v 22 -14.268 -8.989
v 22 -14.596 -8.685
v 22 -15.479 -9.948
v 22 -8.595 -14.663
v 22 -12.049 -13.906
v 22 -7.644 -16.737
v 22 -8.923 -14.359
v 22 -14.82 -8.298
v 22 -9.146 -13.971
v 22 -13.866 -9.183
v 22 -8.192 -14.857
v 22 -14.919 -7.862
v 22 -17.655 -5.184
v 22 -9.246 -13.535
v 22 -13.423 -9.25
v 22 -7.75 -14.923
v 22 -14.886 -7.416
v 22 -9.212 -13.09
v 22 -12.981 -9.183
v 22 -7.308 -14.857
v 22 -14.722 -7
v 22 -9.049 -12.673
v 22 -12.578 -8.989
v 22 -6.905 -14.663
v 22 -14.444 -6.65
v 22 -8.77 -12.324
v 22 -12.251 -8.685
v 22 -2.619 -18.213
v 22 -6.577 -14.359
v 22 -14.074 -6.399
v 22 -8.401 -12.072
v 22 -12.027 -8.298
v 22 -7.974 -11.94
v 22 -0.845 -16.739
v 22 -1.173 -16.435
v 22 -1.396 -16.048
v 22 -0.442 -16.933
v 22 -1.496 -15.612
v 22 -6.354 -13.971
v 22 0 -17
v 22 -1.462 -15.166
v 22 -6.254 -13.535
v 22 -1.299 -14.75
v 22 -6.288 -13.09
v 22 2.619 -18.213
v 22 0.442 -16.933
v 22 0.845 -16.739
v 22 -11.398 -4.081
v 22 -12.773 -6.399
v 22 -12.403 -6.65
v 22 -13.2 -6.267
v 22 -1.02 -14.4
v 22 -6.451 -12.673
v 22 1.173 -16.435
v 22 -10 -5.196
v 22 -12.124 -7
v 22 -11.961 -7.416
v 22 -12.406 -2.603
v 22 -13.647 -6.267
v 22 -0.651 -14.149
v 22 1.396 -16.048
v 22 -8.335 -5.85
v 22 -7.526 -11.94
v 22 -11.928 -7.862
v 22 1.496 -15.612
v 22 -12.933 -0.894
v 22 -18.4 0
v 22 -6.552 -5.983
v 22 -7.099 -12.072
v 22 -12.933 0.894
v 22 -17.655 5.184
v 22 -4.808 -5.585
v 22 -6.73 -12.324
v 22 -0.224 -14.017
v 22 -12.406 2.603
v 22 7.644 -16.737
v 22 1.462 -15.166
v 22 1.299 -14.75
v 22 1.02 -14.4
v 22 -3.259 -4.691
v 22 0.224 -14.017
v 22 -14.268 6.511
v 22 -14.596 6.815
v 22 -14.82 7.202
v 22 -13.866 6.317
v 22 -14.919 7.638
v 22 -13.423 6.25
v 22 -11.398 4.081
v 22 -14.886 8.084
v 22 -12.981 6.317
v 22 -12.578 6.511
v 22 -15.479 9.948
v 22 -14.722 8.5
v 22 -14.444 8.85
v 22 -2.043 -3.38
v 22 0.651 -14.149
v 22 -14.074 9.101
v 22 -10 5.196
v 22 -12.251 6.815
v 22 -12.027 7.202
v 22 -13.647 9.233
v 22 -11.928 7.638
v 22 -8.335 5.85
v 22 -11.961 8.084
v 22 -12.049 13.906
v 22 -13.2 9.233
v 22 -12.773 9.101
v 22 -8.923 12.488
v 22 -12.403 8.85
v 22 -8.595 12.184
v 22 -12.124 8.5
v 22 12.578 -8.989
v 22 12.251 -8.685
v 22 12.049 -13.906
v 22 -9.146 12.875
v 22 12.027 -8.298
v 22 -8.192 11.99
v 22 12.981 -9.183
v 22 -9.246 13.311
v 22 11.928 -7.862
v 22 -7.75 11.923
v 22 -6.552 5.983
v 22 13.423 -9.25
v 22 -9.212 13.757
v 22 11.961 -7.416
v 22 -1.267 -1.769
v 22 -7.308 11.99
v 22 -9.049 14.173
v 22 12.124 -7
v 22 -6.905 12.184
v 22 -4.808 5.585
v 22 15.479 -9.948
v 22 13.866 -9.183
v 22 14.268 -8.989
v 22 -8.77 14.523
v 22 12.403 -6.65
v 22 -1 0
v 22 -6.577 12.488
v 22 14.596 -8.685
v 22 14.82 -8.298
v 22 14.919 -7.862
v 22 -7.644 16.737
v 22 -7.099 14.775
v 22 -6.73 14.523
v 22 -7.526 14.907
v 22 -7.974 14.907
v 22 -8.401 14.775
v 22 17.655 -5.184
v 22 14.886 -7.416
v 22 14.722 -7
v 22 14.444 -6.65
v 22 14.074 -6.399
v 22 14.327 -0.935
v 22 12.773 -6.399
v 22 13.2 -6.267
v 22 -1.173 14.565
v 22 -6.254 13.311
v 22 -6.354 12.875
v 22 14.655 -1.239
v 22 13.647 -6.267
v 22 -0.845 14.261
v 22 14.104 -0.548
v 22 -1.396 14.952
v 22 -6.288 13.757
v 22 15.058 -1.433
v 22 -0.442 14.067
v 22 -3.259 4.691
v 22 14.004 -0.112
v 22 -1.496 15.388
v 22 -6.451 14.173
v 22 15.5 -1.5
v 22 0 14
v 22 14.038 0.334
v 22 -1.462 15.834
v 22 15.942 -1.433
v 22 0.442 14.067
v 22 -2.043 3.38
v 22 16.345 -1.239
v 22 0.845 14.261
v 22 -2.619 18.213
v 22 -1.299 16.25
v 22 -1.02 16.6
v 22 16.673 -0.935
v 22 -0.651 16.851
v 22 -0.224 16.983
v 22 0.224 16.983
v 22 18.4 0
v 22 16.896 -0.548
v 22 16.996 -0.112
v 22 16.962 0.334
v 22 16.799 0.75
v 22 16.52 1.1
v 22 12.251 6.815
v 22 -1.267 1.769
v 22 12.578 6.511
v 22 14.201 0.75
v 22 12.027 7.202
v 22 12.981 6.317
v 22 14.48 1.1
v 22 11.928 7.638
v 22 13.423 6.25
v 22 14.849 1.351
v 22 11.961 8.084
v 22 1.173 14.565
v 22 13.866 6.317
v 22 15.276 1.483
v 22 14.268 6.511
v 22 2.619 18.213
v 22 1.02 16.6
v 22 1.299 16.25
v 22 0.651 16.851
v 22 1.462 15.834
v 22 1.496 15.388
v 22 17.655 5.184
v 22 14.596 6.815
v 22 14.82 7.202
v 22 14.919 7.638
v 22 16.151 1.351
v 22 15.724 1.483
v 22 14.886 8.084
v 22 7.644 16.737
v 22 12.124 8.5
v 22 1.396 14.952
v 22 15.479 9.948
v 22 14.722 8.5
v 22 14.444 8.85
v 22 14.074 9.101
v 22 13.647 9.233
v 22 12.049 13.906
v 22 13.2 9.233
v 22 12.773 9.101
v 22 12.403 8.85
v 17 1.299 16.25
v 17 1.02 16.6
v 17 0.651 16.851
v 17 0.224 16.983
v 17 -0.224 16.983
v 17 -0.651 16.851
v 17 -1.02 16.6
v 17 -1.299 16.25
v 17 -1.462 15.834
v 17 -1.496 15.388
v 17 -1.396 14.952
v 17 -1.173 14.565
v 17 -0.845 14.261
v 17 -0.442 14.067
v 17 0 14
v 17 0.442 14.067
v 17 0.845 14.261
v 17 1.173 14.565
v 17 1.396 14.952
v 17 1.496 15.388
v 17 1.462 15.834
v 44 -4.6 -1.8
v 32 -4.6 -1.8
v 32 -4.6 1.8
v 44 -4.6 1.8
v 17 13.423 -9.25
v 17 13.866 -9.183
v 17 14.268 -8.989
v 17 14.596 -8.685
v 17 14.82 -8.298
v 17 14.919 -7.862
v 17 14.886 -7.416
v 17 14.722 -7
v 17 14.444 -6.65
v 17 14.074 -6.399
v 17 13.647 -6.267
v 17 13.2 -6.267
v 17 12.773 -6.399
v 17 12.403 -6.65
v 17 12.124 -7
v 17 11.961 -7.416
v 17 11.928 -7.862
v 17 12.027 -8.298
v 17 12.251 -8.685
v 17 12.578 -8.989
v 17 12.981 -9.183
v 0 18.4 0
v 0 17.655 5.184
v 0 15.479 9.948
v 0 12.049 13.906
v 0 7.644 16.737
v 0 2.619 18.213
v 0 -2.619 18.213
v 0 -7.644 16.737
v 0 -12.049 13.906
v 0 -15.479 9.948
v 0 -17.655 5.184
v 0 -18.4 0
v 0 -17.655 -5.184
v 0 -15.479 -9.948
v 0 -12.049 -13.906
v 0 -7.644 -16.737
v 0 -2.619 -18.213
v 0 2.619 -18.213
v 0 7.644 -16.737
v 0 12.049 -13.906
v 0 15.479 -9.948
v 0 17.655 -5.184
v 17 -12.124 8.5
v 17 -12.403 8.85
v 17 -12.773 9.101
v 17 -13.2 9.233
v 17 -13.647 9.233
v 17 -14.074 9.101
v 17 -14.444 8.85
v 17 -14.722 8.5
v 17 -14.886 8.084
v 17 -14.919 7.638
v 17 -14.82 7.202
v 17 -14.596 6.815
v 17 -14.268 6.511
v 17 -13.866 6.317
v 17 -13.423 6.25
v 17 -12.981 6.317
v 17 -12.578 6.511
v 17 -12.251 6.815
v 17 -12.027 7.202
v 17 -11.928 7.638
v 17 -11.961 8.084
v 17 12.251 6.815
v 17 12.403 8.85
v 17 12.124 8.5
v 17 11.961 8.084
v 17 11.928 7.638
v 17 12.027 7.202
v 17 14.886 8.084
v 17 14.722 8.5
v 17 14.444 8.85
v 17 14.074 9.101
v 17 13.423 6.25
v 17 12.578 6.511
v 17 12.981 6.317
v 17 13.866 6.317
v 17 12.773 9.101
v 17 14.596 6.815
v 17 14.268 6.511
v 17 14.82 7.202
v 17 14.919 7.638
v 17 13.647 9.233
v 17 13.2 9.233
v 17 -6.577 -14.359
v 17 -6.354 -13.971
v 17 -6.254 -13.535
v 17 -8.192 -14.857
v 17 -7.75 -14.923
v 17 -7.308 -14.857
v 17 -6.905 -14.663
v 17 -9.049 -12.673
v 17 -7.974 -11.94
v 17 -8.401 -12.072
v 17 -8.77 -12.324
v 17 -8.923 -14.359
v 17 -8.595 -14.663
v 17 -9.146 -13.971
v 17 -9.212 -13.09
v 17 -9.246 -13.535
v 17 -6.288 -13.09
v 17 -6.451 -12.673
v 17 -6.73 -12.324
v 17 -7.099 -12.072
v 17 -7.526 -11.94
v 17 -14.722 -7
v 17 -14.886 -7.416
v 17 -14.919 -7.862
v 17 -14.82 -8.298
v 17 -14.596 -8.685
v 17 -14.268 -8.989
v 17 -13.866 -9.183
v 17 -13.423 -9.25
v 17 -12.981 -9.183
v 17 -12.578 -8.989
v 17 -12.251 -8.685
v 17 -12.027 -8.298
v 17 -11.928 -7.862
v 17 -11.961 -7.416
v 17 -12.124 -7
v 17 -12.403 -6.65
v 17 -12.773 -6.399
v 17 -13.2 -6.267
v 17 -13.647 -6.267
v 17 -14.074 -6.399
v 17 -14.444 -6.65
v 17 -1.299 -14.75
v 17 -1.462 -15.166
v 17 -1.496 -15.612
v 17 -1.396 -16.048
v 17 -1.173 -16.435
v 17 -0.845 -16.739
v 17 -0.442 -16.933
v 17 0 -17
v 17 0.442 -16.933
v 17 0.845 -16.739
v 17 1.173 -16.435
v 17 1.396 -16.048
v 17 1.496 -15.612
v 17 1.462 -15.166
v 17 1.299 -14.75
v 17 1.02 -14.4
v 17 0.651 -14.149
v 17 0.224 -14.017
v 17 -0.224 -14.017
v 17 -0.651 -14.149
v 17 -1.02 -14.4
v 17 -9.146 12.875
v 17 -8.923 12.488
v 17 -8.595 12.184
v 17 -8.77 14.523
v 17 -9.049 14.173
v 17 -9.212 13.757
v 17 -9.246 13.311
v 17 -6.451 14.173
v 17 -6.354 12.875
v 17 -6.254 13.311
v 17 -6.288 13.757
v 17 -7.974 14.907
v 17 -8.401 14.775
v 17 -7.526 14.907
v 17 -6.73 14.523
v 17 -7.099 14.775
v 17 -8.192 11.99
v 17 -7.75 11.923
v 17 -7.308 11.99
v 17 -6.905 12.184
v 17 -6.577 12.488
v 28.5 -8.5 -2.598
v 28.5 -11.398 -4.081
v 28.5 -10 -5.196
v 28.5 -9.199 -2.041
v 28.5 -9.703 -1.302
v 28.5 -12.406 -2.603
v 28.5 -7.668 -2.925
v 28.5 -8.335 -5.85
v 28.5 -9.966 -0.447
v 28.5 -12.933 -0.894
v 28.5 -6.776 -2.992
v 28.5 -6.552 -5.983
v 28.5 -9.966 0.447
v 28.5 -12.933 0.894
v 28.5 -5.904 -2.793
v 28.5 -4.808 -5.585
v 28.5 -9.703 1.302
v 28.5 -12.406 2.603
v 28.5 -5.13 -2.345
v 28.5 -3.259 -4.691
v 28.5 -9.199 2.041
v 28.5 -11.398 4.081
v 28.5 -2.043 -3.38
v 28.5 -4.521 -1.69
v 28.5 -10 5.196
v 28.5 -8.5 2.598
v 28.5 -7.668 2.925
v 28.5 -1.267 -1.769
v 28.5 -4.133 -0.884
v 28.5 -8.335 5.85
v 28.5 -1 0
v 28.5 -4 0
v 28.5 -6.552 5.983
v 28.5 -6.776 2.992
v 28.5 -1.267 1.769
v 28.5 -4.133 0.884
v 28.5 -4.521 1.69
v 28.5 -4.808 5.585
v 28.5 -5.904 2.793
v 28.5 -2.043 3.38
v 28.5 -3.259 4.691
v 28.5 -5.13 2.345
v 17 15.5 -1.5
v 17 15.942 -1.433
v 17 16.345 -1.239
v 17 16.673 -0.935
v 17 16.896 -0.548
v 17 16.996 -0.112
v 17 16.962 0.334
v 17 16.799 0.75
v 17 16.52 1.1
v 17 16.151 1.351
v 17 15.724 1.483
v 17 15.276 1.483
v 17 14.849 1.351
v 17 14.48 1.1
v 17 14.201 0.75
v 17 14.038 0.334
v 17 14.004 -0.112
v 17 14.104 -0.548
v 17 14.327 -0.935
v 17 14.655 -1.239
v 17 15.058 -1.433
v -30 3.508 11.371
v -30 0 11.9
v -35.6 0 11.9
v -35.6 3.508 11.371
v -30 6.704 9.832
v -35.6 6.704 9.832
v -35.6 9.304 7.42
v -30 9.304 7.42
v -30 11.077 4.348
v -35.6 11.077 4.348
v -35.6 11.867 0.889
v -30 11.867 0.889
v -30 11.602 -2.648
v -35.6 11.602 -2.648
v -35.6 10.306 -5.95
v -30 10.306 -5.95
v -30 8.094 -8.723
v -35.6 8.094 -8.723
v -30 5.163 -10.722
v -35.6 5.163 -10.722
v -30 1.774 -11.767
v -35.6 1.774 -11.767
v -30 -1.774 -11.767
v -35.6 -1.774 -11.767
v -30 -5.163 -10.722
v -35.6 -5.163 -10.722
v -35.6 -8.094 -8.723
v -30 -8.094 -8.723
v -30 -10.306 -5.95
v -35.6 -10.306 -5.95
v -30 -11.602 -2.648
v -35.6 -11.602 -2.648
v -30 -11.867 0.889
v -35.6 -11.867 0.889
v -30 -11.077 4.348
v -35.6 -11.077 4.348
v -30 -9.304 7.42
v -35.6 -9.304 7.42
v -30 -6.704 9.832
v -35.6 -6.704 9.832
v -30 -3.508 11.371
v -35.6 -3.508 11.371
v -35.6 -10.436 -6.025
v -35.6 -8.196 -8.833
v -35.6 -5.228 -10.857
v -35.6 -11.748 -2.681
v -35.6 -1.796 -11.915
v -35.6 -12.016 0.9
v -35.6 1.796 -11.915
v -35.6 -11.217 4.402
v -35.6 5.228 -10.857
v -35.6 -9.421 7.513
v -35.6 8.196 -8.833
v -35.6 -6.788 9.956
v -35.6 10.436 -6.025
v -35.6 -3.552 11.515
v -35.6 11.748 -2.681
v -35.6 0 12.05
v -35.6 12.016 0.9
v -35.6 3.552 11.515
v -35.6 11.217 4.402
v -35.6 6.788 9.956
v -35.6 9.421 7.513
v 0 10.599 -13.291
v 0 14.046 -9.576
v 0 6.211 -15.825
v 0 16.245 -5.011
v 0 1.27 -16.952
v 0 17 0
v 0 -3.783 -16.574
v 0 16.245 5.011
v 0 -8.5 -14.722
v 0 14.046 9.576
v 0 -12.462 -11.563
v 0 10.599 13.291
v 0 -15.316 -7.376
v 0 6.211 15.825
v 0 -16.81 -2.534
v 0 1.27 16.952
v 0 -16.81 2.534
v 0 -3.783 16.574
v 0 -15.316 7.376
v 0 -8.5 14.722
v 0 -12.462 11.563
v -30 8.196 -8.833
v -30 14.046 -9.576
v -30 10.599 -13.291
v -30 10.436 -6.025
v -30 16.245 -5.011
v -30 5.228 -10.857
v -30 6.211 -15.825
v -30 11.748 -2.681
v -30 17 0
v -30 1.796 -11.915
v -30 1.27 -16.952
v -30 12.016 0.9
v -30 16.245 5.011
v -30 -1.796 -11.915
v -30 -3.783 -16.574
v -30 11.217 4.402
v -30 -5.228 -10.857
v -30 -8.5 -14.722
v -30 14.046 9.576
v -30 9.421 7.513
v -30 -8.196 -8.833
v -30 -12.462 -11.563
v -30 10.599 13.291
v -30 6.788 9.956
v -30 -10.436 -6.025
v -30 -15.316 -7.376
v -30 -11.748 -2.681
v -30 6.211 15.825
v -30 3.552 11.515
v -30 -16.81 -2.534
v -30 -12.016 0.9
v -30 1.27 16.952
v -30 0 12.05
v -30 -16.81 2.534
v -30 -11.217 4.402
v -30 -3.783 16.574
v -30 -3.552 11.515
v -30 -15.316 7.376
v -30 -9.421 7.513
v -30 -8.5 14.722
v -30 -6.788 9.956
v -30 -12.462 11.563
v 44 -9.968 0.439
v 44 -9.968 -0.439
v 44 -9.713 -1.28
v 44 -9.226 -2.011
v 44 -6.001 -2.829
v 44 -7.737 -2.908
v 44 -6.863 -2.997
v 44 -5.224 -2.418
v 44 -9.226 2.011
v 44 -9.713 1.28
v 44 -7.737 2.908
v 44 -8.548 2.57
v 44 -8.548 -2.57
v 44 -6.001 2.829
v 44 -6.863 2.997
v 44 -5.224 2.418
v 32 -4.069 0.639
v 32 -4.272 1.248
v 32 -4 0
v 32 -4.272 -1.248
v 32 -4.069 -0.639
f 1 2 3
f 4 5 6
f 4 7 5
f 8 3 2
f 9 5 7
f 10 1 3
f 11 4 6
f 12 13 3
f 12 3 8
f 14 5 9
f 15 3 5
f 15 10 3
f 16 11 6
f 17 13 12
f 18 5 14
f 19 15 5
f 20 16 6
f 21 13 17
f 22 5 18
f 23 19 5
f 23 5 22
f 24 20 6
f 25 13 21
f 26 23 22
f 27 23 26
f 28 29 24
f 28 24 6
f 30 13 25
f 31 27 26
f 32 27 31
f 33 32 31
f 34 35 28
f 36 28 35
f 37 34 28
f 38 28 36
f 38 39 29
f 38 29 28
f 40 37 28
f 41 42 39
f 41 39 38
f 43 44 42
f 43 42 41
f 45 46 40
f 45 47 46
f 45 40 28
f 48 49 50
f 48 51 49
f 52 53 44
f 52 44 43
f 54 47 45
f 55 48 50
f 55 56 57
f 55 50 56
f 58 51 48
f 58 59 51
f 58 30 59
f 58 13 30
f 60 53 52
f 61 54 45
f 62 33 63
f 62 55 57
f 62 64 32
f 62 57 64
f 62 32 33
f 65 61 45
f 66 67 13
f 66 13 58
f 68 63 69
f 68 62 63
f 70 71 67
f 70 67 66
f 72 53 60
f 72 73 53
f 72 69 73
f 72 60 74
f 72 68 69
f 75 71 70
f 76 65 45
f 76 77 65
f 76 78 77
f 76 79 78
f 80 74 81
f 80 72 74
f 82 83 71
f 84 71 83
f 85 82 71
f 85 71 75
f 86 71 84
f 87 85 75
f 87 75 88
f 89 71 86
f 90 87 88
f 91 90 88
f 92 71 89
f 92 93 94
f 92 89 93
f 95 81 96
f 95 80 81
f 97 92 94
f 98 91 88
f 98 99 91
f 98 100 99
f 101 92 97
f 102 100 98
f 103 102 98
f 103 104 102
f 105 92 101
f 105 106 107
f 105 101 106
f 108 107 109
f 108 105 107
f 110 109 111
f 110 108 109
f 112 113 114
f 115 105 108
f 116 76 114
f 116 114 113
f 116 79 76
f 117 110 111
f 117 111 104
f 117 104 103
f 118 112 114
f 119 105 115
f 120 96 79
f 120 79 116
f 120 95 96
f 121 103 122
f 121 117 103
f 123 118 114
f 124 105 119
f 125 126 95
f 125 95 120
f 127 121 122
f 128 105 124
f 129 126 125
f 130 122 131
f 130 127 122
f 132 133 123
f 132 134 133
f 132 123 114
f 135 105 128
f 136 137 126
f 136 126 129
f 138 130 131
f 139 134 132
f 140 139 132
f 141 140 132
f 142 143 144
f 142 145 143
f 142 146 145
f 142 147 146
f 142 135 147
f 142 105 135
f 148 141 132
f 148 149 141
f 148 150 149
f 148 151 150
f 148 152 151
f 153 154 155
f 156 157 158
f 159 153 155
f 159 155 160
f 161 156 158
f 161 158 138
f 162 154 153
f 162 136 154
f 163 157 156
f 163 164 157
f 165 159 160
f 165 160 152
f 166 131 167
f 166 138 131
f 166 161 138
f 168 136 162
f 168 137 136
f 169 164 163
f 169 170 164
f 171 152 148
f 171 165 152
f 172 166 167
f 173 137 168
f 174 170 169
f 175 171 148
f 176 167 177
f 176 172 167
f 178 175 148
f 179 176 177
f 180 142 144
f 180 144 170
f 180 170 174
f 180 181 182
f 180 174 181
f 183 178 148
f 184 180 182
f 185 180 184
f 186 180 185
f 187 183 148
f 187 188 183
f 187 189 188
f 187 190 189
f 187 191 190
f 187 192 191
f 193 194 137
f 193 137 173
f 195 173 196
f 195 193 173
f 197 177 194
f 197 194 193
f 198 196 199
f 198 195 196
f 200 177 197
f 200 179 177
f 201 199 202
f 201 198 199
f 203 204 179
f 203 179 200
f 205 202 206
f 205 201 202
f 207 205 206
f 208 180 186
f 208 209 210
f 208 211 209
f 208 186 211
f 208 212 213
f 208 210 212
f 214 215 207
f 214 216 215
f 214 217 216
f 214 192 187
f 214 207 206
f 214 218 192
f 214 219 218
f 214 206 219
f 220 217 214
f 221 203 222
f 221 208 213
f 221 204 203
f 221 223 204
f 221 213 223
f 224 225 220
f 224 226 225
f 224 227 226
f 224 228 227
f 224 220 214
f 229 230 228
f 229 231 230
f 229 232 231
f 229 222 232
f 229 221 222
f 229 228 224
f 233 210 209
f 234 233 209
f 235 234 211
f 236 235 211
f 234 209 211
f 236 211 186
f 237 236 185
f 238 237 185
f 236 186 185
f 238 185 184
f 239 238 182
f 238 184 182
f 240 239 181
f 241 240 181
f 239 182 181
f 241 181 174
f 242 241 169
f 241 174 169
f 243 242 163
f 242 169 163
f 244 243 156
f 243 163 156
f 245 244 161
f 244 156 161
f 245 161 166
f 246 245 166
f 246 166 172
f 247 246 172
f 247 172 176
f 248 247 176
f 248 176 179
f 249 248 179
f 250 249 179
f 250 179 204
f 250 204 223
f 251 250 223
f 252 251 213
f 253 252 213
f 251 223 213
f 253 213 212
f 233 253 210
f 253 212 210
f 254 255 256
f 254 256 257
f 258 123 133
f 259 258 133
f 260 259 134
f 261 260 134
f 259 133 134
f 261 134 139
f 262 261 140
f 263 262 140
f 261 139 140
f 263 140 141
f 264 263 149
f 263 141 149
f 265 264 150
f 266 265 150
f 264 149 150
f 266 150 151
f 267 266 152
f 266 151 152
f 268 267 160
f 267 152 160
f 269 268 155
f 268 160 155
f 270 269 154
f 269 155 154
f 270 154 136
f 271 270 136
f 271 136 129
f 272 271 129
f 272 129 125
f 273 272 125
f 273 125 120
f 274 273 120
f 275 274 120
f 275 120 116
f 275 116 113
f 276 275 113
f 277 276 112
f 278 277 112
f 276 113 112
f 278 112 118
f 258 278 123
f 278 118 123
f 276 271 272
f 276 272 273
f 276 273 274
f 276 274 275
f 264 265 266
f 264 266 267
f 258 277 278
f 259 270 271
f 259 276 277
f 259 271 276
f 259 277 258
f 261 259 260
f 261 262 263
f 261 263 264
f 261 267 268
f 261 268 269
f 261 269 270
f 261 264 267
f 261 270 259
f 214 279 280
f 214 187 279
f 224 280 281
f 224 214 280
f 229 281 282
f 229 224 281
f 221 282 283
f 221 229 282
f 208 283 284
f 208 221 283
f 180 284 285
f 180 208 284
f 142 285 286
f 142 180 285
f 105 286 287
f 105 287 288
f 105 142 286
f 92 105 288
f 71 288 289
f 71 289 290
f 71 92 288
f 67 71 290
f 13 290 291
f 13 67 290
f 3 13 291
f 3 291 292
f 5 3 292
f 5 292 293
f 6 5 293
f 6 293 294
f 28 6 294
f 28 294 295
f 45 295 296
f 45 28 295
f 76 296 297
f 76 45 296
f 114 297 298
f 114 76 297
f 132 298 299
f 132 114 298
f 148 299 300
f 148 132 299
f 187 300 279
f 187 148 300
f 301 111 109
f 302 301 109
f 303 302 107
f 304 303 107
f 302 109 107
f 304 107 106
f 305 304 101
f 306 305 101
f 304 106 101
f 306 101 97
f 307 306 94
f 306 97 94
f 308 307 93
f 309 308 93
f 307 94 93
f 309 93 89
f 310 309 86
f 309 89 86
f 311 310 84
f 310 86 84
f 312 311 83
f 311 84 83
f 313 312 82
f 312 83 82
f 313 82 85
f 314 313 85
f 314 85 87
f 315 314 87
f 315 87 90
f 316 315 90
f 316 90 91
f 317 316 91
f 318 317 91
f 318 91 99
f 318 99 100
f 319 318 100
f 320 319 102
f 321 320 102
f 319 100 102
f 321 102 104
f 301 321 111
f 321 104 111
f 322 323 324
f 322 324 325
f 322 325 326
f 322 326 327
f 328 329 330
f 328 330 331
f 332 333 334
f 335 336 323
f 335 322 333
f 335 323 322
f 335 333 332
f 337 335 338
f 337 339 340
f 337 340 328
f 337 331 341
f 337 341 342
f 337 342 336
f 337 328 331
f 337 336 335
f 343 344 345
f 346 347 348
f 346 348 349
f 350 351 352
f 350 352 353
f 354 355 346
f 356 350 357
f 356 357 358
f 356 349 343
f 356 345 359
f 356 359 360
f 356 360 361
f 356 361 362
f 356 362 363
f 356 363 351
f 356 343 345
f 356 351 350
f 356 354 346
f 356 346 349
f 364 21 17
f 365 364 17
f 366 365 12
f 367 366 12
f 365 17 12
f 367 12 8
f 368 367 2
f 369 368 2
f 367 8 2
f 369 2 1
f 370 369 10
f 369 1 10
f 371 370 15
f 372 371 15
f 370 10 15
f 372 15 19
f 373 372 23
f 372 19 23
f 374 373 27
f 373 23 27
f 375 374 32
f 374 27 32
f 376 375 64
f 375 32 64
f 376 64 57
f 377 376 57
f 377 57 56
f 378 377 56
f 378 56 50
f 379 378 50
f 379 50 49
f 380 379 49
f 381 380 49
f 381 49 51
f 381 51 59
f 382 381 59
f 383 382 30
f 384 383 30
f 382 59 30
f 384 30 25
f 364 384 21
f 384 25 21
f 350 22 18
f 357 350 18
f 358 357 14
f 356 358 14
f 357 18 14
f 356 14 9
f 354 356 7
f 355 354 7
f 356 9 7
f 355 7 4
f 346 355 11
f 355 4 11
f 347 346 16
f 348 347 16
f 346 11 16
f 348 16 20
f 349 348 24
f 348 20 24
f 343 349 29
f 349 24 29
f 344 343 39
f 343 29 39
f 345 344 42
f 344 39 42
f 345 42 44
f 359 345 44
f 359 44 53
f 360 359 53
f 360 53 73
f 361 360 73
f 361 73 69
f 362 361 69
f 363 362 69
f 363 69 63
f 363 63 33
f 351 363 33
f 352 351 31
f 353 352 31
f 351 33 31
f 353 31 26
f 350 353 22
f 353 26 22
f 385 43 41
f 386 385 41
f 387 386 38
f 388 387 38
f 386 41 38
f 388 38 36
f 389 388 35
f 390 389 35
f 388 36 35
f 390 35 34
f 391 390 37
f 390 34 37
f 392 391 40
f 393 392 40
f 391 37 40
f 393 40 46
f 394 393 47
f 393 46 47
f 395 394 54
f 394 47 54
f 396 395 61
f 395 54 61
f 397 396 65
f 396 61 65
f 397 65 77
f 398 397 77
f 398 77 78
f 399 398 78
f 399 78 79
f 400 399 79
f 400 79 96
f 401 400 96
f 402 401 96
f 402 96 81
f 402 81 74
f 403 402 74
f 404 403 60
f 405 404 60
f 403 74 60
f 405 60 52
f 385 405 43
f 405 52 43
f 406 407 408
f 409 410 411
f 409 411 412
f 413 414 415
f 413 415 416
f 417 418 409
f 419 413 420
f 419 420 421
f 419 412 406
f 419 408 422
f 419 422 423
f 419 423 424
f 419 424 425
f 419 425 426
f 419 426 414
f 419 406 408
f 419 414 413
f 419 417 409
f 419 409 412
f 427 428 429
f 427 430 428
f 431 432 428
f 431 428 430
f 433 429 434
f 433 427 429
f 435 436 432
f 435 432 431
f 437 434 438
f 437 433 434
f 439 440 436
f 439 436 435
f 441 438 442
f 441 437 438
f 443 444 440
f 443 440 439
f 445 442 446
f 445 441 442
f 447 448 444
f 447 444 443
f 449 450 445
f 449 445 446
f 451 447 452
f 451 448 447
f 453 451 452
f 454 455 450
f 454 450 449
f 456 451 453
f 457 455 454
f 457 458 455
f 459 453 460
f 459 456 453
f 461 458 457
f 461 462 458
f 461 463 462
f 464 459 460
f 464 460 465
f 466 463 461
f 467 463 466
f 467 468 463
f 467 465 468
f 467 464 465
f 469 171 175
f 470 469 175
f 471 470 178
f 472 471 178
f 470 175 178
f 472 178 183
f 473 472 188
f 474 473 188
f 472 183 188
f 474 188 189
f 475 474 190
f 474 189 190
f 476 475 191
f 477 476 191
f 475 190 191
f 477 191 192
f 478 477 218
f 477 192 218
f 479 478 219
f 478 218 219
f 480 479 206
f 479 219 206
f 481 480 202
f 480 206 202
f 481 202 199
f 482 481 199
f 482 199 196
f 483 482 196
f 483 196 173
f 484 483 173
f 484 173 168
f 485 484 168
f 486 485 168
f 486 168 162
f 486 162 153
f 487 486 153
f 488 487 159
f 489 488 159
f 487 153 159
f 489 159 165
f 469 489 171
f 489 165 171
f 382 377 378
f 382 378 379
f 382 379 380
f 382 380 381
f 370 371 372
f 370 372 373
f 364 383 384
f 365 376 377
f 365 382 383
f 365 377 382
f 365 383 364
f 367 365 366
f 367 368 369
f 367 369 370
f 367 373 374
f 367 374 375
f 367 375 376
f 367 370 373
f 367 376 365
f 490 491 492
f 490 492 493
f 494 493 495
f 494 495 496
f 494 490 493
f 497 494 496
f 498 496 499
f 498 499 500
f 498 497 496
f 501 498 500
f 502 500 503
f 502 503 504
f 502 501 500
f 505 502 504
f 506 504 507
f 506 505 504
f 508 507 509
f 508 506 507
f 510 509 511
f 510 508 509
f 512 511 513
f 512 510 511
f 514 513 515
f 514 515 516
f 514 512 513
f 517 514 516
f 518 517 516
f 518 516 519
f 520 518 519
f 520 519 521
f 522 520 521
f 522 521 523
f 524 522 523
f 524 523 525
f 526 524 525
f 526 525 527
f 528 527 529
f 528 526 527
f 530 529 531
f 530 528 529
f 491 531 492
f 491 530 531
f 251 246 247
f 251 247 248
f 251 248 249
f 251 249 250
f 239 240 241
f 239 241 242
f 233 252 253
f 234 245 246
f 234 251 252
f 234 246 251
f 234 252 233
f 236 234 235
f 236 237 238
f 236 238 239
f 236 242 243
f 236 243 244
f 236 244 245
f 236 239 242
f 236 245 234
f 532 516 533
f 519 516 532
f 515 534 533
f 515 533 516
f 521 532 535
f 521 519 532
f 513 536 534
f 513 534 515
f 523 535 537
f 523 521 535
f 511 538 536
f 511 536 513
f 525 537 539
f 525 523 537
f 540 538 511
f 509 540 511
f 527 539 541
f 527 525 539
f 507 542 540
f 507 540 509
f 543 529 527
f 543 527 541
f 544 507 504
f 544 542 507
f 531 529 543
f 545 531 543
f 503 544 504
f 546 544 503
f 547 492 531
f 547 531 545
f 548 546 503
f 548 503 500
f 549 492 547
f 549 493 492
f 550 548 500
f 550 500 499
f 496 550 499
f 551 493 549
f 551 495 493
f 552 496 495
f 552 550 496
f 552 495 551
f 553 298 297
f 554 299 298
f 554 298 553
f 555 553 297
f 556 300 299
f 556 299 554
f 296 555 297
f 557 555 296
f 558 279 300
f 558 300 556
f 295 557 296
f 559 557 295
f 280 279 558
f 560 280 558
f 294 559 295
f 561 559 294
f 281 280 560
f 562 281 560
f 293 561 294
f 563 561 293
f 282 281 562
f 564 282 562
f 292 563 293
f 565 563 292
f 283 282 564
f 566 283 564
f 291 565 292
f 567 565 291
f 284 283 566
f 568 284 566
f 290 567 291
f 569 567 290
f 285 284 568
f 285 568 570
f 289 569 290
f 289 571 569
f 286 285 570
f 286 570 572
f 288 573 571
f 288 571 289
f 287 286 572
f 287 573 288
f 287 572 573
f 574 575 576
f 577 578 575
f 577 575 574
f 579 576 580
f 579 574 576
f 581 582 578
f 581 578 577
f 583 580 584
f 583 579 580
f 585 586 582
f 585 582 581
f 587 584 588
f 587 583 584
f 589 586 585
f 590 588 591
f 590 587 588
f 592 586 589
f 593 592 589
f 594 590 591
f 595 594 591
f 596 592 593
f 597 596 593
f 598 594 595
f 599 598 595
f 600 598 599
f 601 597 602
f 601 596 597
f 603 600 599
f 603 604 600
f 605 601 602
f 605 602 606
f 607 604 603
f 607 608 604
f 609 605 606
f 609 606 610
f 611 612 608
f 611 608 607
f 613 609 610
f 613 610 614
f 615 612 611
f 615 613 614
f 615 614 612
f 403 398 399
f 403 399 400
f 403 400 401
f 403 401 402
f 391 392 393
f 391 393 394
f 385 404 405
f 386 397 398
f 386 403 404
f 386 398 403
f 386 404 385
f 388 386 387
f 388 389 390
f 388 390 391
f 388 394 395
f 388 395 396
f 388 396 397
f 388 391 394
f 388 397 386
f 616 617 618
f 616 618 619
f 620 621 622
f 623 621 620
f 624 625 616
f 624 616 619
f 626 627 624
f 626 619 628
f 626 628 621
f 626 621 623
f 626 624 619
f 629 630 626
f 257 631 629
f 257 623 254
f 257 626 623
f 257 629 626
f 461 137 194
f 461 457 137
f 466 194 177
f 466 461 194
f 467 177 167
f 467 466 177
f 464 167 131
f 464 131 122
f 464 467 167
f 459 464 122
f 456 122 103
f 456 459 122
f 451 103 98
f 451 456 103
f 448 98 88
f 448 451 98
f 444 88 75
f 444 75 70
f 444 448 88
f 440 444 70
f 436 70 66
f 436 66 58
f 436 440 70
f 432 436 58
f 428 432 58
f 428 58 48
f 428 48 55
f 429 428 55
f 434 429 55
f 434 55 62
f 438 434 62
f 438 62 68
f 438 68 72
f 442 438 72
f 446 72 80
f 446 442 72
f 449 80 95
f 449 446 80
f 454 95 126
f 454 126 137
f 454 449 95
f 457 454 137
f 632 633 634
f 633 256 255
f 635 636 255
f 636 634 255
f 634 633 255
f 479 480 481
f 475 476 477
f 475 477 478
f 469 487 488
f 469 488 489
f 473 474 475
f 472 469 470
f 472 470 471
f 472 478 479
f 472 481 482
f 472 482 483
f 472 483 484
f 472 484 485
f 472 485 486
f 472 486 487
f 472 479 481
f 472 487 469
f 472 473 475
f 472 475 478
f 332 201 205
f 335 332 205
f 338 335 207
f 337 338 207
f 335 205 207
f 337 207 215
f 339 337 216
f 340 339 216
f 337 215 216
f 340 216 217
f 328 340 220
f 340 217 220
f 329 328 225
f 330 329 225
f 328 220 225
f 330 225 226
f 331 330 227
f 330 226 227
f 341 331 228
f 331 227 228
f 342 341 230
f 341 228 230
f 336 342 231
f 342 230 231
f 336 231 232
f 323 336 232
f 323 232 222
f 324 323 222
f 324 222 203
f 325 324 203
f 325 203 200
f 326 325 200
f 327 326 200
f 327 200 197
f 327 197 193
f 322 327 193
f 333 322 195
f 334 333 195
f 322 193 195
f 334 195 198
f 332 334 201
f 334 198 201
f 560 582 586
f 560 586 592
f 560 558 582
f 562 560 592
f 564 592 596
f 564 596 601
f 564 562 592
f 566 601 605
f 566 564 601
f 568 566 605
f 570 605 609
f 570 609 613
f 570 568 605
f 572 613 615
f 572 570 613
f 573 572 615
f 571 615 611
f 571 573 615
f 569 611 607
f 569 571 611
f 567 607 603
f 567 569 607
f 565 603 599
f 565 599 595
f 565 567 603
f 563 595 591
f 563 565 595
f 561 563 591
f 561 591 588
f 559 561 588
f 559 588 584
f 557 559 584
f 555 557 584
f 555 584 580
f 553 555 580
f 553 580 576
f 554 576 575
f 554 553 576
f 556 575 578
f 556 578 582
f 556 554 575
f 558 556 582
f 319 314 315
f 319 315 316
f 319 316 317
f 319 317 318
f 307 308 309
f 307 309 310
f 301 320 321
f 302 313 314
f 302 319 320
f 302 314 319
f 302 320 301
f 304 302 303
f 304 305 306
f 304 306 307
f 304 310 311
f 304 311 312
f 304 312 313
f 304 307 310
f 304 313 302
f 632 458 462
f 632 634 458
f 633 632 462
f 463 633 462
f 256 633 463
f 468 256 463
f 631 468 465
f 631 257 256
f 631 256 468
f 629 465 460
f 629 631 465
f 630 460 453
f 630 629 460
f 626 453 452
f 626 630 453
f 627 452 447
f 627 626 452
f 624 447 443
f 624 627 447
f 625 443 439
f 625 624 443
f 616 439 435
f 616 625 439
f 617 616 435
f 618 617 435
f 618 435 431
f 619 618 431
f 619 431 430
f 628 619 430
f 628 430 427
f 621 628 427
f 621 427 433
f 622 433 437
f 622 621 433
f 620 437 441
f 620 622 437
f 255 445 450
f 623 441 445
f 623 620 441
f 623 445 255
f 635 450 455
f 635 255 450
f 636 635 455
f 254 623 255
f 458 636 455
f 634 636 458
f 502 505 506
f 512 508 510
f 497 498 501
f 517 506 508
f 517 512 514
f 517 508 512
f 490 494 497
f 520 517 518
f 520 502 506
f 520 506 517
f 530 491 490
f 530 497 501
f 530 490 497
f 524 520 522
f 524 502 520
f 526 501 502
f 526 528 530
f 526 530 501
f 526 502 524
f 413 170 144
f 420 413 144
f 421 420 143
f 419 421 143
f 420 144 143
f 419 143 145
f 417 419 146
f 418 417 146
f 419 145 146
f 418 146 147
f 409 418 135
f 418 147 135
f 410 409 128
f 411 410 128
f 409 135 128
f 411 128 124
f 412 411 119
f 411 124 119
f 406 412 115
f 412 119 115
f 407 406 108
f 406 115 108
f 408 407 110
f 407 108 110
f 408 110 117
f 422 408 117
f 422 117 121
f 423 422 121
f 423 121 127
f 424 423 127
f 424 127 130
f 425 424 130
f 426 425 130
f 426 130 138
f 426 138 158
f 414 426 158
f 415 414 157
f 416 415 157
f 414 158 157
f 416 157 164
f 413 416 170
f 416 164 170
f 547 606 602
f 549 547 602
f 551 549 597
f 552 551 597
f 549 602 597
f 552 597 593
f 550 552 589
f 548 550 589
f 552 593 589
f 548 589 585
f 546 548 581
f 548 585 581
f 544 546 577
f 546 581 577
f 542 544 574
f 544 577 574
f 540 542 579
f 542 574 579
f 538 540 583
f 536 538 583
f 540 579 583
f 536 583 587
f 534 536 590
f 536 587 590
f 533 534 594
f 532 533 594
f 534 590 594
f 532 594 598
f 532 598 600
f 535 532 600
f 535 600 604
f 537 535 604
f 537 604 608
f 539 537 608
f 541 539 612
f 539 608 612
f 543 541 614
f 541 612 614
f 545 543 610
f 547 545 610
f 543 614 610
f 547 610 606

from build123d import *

# Parameters (mm, degrees)
ENL_V_MAT_EXTRU_1_DEPTH      = 10
ENL_V_MAT_EXTRU_1_DEPTH_BACK = 10
ESQUISSE4_W                  = 18.656759262
ESQUISSE4_H                  = 11.470185
ESQUISSE5_R                  = 12.05
ESQUISSE5_R_2                = 11.9
BOSS_EXTRU_1_DEPTH           = 5.6
ESQUISSE6_R                  = 1.5
ENL_V_MAT_EXTRU_2_DEPTH      = 5
R_P_TITION_CIRCULAIRE1_COUNT = 3


with BuildPart() as part:
    # Esquisse1 → Révolution1 (revolve)
    with BuildSketch(Plane.XY):
        Polygon((-30, 0), (-30, 17), (0, 17), (0, 18.4), (22, 18.4), (22, 0), align=None)
    revolve(axis=Axis((-59.117838542, 0, 0), (1, 0, 0)))

    # Esquisse3 → Révolution2 (revolve)
    with BuildSketch(Plane.XY):
        Polygon((22, -1), (28.5, -1), (28.5, -4), (44, -4), (44, -7), (22, -7), align=None)
    revolve(axis=Axis((8.410725031, -7, 0), (1, 0, 0)))

    # Esquisse4 → Enlèv. mat.-Extru.1 (cut, two sides: drawn at the far end of the back side and taken through both)
    with BuildSketch(Plane.XY.offset(-ENL_V_MAT_EXTRU_1_DEPTH_BACK)):
        with Locations((41.328379631, 1.1350925)):
            Rectangle(ESQUISSE4_W, ESQUISSE4_H)
    extrude(amount=ENL_V_MAT_EXTRU_1_DEPTH + ENL_V_MAT_EXTRU_1_DEPTH_BACK, mode=Mode.SUBTRACT)

    # Esquisse5 → Boss.-Extru.1 (add)
    with BuildSketch(Plane.ZY.offset(30)):
        Circle(ESQUISSE5_R)
        Circle(ESQUISSE5_R_2, mode=Mode.SUBTRACT)
    extrude(amount=BOSS_EXTRU_1_DEPTH)

    # Esquisse6 → Enlèv. mat.-Extru.2 (cut)
    with BuildSketch(Plane(origin=(22, 0, 0), x_dir=(0, 0, -1), z_dir=(1, 0, 0))):
        with Locations((0, 15.5)):
            Circle(ESQUISSE6_R)
        with Locations((7.75, 13.423393759)):
            Circle(ESQUISSE6_R)
        with Locations((-7.75, 13.423393759)):
            Circle(ESQUISSE6_R)
    enl_v_mat_extru_2 = extrude(amount=-ENL_V_MAT_EXTRU_2_DEPTH, mode=Mode.SUBTRACT)

    # Répétition circulaire1: Enlèv. mat.-Extru.2 ×3 about axis
    r_p_tition_circulaire1_axis = Axis((22, 0, 0), (-1, 0, 0))
    for i in range(1, R_P_TITION_CIRCULAIRE1_COUNT):
        add(enl_v_mat_extru_2.rotate(r_p_tition_circulaire1_axis, i * 360 / R_P_TITION_CIRCULAIRE1_COUNT), mode=Mode.SUBTRACT)


solid = part.part
